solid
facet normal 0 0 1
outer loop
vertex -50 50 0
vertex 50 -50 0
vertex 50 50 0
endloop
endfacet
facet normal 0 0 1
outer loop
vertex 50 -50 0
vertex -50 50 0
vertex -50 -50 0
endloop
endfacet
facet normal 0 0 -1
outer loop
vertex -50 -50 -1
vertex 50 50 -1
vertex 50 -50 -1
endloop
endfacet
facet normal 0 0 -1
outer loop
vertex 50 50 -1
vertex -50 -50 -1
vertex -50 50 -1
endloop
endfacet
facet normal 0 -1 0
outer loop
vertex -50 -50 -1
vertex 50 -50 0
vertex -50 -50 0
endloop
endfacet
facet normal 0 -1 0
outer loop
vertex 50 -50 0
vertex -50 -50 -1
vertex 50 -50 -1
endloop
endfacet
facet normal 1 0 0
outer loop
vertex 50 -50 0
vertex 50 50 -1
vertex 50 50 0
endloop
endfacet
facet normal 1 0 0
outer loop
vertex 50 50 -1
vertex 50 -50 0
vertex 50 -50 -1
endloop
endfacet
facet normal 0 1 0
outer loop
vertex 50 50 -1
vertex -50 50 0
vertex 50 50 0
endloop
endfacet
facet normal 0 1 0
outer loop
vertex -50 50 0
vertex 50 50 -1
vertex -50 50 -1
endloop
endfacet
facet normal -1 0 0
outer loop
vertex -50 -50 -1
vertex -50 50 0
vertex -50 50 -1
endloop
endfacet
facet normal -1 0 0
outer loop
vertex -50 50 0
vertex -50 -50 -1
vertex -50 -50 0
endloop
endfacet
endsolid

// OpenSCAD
// Fill pattern.

module bars(
	spacing=1.0
	, barWidth=1.0
	, minLength=10
	, minWidth=10
	, angle=0
	) {
  rotate([0,0,angle]) {
	square(size=[barWidth,minWidth], center=true);
    assign( barCount=(minLength-(minLength)%(spacing+barWidth))/(spacing+barWidth)+1 ) {
     for ( ln = [1 : 
		(barCount-barCount%2)/2 ] ) {
      translate([ln*(spacing+barWidth),0])
        square(size=[barWidth,minWidth], center=true);
      translate([-ln*(spacing+barWidth),0])
        square(size=[barWidth,minWidth], center=true);
     }
    }
  }
}

module fill_linear(
	spacing=2.0
	, barWidth=2.0
	, minLength=100
	, minWidth=100
	, angle=0
	) {
  for ( i = [0 : $children-1] ) {
    intersection () {
      child(i);
      bars(spacing=spacing,barWidth=barWidth,minLength=minLength,minWidth=minWidth,angle=angle);
    }
  }
}

translate([0,0,-0.5]) color([0.5,0.5,0.5]) cube(size=[100,100,1.0],center=true);
bars(
	spacing=1.0
	, barWidth=1.0
	, minLength=100
	, minWidth=100
	, angle=0
	);

translate([0,0,2]) fill_linear(spacing=1.0,barWidth=4.0,minLength=20,minWidth=20) {
   circle(r=10.0);
  }
translate([0,0,4]) fill_linear(spacing=2.0,barWidth=3.0,minLength=20,minWidth=20, angle=60) {
   circle(r=10.0);
  }
translate([0,0,6]) fill_linear(spacing=3.0,barWidth=2.0,minLength=20,minWidth=20, angle=120) {
  circle(r=10.0);
 }
